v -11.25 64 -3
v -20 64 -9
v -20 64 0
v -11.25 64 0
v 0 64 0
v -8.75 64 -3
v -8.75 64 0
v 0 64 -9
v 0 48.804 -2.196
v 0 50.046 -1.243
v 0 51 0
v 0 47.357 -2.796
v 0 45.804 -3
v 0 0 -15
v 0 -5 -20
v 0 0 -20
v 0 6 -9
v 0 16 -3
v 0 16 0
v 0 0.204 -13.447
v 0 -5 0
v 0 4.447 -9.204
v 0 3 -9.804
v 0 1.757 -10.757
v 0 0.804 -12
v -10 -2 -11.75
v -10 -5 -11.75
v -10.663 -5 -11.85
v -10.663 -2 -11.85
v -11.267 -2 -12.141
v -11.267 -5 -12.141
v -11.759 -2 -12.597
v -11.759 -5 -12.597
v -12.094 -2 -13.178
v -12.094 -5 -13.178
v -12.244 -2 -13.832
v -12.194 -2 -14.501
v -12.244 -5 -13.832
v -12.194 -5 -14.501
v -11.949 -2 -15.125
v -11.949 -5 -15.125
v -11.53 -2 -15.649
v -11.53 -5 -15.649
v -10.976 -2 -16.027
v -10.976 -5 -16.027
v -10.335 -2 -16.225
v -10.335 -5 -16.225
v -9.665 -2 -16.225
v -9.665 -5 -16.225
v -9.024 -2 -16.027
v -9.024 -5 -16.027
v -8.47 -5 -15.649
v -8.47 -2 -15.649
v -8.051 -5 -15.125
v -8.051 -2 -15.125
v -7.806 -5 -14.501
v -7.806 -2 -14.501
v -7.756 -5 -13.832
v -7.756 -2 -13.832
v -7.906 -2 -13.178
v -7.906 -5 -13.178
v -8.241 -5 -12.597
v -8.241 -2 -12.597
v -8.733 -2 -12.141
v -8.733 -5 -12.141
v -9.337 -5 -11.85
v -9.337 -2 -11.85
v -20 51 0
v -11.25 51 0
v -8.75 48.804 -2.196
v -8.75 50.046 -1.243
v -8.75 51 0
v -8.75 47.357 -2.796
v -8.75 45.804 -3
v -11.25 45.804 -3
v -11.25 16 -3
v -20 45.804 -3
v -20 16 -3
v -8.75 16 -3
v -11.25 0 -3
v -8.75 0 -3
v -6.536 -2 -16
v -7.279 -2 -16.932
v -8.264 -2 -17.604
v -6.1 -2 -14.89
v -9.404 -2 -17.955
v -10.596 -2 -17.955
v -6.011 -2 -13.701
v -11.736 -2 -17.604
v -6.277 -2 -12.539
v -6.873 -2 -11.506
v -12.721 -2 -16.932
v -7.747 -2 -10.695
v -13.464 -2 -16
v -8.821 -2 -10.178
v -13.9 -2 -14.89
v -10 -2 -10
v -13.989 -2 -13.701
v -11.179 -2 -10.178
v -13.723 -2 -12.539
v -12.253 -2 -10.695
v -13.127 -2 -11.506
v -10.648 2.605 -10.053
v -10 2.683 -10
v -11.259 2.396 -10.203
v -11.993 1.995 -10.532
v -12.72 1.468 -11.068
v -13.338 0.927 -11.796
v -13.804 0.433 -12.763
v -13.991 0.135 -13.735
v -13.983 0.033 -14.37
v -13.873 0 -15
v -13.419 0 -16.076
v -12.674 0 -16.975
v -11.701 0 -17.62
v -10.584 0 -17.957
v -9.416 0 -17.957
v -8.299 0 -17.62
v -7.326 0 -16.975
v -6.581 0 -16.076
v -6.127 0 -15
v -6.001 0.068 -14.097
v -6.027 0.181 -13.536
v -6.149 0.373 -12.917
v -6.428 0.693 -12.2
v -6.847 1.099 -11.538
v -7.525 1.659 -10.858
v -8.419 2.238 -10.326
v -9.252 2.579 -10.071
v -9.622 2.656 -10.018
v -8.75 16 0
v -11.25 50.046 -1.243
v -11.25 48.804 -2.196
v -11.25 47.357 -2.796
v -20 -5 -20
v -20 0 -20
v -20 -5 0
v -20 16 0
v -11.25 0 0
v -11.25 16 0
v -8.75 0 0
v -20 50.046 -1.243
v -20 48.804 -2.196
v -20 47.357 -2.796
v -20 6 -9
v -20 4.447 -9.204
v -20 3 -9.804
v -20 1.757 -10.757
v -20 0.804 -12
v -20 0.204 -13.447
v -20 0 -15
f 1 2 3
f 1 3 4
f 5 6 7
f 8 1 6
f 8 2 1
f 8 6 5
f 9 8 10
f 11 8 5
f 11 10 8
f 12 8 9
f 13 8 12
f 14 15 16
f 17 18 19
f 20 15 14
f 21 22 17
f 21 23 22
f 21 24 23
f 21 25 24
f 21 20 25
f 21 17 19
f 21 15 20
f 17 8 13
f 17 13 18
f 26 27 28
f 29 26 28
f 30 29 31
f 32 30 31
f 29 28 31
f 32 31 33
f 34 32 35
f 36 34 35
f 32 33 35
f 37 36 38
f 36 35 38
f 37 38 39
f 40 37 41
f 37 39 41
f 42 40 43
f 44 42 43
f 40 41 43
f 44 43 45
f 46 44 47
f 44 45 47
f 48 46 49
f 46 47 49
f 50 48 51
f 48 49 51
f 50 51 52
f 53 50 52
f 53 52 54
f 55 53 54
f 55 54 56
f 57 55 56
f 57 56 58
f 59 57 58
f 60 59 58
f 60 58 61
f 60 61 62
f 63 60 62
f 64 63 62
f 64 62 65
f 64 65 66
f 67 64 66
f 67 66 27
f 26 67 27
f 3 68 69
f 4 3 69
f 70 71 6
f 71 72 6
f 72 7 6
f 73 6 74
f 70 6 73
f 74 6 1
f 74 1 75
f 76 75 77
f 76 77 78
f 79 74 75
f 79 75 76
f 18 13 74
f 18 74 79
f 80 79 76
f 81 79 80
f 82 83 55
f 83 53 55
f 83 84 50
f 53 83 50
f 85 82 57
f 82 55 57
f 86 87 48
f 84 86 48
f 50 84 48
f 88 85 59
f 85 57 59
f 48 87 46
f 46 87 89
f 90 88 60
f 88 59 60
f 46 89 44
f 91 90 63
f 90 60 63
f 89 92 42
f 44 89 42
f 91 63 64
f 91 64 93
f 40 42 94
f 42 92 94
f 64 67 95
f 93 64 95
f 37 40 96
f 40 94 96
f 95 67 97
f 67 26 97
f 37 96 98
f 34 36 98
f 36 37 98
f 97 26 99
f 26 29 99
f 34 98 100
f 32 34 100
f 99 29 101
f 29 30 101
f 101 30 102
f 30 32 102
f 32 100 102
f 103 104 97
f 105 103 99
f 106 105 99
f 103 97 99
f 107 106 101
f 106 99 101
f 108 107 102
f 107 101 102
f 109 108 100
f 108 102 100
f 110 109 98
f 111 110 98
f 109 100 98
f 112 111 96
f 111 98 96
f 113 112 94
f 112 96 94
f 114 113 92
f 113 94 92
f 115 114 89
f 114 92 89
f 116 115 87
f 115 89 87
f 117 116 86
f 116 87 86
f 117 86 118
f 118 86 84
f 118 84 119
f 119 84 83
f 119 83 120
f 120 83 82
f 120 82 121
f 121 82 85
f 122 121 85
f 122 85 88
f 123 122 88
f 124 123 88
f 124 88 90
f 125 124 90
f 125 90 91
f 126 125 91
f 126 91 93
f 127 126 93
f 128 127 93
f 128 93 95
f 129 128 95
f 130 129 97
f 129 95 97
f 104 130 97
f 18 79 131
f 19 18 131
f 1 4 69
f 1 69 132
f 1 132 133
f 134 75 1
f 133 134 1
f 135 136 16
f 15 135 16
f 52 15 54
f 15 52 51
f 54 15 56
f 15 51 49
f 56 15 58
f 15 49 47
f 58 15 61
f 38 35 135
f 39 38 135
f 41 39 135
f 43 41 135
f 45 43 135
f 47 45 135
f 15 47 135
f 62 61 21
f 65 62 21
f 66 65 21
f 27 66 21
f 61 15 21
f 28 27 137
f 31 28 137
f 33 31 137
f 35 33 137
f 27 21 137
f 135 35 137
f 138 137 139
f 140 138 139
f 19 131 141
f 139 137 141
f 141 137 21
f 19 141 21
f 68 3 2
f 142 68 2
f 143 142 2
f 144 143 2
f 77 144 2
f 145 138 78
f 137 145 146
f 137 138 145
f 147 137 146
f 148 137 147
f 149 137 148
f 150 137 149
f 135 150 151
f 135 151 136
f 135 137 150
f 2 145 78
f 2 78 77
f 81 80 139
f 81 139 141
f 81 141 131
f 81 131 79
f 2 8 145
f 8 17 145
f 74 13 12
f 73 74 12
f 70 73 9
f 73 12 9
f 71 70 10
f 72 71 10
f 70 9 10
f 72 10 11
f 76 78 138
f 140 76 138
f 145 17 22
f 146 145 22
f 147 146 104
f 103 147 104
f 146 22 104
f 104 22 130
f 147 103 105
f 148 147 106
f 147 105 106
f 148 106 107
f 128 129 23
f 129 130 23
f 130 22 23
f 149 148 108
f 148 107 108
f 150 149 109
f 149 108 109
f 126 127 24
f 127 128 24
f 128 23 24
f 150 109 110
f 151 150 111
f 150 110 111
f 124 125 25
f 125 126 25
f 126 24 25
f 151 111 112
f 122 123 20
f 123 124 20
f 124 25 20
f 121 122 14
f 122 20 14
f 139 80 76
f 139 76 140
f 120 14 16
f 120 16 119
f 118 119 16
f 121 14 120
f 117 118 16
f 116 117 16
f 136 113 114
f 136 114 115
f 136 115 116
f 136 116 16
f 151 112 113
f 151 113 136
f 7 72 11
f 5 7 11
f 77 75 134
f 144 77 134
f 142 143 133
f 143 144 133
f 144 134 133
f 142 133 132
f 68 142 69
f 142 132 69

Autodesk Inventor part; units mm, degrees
ref_plane "YZ Plane" through (0, 0, 0) normal (1, 0, 0) x (0, 1, 0)
ref_plane "XZ Plane" through (0, 0, 0) normal (0, 1, 0) x (-1, 0, 0)
ref_plane "XY Plane" through (0, 0, 0) normal (0, 0, 1) x (1, 0, 0)
sketch "Sketch1" plane through (0, 0, 0) normal (0, 1, 0) x (-1, 0, 0)
  line L0 (0, 0) -> (20, 0)
  line L1 (20, 0) -> (20, -20)
  line L2 (20, -20) -> (0, -20)
  line L3 (0, -20) -> (0, 0)
  point P0 (10, -14)
  dimension "d0" = 20
  dimension "d1" = 20
  dimension "d4" = 10
  dimension "d5" = 6
extrude "Extrusion1" add sketch "Sketch1" against normal blind 5
hole "Hole1" at (-10, 0, -14) direction (0, -1, 0) diameter 4.5 end through all counterbore diameter 8 counterbore depth 2
sketch "Sketch2" plane through (0, 0, 0) normal (0, 1, 0) x (1, 0, 0)
  line L0 (-20, 0) -> (-20, 20) projected
  line L1 (0, 20) -> (0, 0) projected
  line L2 (-20, 0) -> (0, 0)
  line L3 (0, 0) -> (0, 9)
  line L4 (0, 9) -> (-20, 9)
  line L5 (-20, 9) -> (-20, 0)
  line L6 (-20, 3) -> (0, 3) construction
  dimension "d13" = 9
  dimension "d14" = 3
extrude "Extrusion2" add sketch "Sketch2" along normal blind 64
sketch "Sketch3" plane through (0, 64, 0) normal (0, 1, 0) x (1, 0, 0)
  line L0 (-11.25, 0) -> (-8.75, 0)
  line L1 (-8.75, 0) -> (-8.75, 3)
  line L2 (-8.75, 3) -> (-11.25, 3)
  line L3 (-11.25, 3) -> (-11.25, 0)
  line L4 (-20, 9) -> (-20, 0) projected
  point P0 (0, 0)
  dimension "d17" = 2.5
  dimension "d18" = 3
  dimension "d19" = 8.75
fillet "Fillet1" radius 6 1 edges at (-10, 0, -9)
extrude "Extrusion3" cut sketch "Sketch3" against normal blind 64
sketch "Sketch4" plane through (0, -5, -20) normal (1, 0, 0) x (0, 0, -1)
  line L0 (-20, 0) -> (-20, 69) projected
  line L1 (-17, 5) -> (-20, 5) projected
  line L2 (-20, 56) -> (-17, 56)
  line L3 (-17, 56) -> (-17, 21)
  line L4 (-17, 21) -> (-20, 21)
  line L5 (-20, 21) -> (-20, 56)
  line L6 (-20, 69) -> (-11, 69) projected
  dimension "d23" = 16
  dimension "d25" = 13
extrude "Extrusion4" cut sketch "Sketch4" against normal blind 64
fillet "Fillet2" radius 6 2 edges at (-15.625, 51, -3) (-4.375, 51, -3)
properties part number "support_lcd"
